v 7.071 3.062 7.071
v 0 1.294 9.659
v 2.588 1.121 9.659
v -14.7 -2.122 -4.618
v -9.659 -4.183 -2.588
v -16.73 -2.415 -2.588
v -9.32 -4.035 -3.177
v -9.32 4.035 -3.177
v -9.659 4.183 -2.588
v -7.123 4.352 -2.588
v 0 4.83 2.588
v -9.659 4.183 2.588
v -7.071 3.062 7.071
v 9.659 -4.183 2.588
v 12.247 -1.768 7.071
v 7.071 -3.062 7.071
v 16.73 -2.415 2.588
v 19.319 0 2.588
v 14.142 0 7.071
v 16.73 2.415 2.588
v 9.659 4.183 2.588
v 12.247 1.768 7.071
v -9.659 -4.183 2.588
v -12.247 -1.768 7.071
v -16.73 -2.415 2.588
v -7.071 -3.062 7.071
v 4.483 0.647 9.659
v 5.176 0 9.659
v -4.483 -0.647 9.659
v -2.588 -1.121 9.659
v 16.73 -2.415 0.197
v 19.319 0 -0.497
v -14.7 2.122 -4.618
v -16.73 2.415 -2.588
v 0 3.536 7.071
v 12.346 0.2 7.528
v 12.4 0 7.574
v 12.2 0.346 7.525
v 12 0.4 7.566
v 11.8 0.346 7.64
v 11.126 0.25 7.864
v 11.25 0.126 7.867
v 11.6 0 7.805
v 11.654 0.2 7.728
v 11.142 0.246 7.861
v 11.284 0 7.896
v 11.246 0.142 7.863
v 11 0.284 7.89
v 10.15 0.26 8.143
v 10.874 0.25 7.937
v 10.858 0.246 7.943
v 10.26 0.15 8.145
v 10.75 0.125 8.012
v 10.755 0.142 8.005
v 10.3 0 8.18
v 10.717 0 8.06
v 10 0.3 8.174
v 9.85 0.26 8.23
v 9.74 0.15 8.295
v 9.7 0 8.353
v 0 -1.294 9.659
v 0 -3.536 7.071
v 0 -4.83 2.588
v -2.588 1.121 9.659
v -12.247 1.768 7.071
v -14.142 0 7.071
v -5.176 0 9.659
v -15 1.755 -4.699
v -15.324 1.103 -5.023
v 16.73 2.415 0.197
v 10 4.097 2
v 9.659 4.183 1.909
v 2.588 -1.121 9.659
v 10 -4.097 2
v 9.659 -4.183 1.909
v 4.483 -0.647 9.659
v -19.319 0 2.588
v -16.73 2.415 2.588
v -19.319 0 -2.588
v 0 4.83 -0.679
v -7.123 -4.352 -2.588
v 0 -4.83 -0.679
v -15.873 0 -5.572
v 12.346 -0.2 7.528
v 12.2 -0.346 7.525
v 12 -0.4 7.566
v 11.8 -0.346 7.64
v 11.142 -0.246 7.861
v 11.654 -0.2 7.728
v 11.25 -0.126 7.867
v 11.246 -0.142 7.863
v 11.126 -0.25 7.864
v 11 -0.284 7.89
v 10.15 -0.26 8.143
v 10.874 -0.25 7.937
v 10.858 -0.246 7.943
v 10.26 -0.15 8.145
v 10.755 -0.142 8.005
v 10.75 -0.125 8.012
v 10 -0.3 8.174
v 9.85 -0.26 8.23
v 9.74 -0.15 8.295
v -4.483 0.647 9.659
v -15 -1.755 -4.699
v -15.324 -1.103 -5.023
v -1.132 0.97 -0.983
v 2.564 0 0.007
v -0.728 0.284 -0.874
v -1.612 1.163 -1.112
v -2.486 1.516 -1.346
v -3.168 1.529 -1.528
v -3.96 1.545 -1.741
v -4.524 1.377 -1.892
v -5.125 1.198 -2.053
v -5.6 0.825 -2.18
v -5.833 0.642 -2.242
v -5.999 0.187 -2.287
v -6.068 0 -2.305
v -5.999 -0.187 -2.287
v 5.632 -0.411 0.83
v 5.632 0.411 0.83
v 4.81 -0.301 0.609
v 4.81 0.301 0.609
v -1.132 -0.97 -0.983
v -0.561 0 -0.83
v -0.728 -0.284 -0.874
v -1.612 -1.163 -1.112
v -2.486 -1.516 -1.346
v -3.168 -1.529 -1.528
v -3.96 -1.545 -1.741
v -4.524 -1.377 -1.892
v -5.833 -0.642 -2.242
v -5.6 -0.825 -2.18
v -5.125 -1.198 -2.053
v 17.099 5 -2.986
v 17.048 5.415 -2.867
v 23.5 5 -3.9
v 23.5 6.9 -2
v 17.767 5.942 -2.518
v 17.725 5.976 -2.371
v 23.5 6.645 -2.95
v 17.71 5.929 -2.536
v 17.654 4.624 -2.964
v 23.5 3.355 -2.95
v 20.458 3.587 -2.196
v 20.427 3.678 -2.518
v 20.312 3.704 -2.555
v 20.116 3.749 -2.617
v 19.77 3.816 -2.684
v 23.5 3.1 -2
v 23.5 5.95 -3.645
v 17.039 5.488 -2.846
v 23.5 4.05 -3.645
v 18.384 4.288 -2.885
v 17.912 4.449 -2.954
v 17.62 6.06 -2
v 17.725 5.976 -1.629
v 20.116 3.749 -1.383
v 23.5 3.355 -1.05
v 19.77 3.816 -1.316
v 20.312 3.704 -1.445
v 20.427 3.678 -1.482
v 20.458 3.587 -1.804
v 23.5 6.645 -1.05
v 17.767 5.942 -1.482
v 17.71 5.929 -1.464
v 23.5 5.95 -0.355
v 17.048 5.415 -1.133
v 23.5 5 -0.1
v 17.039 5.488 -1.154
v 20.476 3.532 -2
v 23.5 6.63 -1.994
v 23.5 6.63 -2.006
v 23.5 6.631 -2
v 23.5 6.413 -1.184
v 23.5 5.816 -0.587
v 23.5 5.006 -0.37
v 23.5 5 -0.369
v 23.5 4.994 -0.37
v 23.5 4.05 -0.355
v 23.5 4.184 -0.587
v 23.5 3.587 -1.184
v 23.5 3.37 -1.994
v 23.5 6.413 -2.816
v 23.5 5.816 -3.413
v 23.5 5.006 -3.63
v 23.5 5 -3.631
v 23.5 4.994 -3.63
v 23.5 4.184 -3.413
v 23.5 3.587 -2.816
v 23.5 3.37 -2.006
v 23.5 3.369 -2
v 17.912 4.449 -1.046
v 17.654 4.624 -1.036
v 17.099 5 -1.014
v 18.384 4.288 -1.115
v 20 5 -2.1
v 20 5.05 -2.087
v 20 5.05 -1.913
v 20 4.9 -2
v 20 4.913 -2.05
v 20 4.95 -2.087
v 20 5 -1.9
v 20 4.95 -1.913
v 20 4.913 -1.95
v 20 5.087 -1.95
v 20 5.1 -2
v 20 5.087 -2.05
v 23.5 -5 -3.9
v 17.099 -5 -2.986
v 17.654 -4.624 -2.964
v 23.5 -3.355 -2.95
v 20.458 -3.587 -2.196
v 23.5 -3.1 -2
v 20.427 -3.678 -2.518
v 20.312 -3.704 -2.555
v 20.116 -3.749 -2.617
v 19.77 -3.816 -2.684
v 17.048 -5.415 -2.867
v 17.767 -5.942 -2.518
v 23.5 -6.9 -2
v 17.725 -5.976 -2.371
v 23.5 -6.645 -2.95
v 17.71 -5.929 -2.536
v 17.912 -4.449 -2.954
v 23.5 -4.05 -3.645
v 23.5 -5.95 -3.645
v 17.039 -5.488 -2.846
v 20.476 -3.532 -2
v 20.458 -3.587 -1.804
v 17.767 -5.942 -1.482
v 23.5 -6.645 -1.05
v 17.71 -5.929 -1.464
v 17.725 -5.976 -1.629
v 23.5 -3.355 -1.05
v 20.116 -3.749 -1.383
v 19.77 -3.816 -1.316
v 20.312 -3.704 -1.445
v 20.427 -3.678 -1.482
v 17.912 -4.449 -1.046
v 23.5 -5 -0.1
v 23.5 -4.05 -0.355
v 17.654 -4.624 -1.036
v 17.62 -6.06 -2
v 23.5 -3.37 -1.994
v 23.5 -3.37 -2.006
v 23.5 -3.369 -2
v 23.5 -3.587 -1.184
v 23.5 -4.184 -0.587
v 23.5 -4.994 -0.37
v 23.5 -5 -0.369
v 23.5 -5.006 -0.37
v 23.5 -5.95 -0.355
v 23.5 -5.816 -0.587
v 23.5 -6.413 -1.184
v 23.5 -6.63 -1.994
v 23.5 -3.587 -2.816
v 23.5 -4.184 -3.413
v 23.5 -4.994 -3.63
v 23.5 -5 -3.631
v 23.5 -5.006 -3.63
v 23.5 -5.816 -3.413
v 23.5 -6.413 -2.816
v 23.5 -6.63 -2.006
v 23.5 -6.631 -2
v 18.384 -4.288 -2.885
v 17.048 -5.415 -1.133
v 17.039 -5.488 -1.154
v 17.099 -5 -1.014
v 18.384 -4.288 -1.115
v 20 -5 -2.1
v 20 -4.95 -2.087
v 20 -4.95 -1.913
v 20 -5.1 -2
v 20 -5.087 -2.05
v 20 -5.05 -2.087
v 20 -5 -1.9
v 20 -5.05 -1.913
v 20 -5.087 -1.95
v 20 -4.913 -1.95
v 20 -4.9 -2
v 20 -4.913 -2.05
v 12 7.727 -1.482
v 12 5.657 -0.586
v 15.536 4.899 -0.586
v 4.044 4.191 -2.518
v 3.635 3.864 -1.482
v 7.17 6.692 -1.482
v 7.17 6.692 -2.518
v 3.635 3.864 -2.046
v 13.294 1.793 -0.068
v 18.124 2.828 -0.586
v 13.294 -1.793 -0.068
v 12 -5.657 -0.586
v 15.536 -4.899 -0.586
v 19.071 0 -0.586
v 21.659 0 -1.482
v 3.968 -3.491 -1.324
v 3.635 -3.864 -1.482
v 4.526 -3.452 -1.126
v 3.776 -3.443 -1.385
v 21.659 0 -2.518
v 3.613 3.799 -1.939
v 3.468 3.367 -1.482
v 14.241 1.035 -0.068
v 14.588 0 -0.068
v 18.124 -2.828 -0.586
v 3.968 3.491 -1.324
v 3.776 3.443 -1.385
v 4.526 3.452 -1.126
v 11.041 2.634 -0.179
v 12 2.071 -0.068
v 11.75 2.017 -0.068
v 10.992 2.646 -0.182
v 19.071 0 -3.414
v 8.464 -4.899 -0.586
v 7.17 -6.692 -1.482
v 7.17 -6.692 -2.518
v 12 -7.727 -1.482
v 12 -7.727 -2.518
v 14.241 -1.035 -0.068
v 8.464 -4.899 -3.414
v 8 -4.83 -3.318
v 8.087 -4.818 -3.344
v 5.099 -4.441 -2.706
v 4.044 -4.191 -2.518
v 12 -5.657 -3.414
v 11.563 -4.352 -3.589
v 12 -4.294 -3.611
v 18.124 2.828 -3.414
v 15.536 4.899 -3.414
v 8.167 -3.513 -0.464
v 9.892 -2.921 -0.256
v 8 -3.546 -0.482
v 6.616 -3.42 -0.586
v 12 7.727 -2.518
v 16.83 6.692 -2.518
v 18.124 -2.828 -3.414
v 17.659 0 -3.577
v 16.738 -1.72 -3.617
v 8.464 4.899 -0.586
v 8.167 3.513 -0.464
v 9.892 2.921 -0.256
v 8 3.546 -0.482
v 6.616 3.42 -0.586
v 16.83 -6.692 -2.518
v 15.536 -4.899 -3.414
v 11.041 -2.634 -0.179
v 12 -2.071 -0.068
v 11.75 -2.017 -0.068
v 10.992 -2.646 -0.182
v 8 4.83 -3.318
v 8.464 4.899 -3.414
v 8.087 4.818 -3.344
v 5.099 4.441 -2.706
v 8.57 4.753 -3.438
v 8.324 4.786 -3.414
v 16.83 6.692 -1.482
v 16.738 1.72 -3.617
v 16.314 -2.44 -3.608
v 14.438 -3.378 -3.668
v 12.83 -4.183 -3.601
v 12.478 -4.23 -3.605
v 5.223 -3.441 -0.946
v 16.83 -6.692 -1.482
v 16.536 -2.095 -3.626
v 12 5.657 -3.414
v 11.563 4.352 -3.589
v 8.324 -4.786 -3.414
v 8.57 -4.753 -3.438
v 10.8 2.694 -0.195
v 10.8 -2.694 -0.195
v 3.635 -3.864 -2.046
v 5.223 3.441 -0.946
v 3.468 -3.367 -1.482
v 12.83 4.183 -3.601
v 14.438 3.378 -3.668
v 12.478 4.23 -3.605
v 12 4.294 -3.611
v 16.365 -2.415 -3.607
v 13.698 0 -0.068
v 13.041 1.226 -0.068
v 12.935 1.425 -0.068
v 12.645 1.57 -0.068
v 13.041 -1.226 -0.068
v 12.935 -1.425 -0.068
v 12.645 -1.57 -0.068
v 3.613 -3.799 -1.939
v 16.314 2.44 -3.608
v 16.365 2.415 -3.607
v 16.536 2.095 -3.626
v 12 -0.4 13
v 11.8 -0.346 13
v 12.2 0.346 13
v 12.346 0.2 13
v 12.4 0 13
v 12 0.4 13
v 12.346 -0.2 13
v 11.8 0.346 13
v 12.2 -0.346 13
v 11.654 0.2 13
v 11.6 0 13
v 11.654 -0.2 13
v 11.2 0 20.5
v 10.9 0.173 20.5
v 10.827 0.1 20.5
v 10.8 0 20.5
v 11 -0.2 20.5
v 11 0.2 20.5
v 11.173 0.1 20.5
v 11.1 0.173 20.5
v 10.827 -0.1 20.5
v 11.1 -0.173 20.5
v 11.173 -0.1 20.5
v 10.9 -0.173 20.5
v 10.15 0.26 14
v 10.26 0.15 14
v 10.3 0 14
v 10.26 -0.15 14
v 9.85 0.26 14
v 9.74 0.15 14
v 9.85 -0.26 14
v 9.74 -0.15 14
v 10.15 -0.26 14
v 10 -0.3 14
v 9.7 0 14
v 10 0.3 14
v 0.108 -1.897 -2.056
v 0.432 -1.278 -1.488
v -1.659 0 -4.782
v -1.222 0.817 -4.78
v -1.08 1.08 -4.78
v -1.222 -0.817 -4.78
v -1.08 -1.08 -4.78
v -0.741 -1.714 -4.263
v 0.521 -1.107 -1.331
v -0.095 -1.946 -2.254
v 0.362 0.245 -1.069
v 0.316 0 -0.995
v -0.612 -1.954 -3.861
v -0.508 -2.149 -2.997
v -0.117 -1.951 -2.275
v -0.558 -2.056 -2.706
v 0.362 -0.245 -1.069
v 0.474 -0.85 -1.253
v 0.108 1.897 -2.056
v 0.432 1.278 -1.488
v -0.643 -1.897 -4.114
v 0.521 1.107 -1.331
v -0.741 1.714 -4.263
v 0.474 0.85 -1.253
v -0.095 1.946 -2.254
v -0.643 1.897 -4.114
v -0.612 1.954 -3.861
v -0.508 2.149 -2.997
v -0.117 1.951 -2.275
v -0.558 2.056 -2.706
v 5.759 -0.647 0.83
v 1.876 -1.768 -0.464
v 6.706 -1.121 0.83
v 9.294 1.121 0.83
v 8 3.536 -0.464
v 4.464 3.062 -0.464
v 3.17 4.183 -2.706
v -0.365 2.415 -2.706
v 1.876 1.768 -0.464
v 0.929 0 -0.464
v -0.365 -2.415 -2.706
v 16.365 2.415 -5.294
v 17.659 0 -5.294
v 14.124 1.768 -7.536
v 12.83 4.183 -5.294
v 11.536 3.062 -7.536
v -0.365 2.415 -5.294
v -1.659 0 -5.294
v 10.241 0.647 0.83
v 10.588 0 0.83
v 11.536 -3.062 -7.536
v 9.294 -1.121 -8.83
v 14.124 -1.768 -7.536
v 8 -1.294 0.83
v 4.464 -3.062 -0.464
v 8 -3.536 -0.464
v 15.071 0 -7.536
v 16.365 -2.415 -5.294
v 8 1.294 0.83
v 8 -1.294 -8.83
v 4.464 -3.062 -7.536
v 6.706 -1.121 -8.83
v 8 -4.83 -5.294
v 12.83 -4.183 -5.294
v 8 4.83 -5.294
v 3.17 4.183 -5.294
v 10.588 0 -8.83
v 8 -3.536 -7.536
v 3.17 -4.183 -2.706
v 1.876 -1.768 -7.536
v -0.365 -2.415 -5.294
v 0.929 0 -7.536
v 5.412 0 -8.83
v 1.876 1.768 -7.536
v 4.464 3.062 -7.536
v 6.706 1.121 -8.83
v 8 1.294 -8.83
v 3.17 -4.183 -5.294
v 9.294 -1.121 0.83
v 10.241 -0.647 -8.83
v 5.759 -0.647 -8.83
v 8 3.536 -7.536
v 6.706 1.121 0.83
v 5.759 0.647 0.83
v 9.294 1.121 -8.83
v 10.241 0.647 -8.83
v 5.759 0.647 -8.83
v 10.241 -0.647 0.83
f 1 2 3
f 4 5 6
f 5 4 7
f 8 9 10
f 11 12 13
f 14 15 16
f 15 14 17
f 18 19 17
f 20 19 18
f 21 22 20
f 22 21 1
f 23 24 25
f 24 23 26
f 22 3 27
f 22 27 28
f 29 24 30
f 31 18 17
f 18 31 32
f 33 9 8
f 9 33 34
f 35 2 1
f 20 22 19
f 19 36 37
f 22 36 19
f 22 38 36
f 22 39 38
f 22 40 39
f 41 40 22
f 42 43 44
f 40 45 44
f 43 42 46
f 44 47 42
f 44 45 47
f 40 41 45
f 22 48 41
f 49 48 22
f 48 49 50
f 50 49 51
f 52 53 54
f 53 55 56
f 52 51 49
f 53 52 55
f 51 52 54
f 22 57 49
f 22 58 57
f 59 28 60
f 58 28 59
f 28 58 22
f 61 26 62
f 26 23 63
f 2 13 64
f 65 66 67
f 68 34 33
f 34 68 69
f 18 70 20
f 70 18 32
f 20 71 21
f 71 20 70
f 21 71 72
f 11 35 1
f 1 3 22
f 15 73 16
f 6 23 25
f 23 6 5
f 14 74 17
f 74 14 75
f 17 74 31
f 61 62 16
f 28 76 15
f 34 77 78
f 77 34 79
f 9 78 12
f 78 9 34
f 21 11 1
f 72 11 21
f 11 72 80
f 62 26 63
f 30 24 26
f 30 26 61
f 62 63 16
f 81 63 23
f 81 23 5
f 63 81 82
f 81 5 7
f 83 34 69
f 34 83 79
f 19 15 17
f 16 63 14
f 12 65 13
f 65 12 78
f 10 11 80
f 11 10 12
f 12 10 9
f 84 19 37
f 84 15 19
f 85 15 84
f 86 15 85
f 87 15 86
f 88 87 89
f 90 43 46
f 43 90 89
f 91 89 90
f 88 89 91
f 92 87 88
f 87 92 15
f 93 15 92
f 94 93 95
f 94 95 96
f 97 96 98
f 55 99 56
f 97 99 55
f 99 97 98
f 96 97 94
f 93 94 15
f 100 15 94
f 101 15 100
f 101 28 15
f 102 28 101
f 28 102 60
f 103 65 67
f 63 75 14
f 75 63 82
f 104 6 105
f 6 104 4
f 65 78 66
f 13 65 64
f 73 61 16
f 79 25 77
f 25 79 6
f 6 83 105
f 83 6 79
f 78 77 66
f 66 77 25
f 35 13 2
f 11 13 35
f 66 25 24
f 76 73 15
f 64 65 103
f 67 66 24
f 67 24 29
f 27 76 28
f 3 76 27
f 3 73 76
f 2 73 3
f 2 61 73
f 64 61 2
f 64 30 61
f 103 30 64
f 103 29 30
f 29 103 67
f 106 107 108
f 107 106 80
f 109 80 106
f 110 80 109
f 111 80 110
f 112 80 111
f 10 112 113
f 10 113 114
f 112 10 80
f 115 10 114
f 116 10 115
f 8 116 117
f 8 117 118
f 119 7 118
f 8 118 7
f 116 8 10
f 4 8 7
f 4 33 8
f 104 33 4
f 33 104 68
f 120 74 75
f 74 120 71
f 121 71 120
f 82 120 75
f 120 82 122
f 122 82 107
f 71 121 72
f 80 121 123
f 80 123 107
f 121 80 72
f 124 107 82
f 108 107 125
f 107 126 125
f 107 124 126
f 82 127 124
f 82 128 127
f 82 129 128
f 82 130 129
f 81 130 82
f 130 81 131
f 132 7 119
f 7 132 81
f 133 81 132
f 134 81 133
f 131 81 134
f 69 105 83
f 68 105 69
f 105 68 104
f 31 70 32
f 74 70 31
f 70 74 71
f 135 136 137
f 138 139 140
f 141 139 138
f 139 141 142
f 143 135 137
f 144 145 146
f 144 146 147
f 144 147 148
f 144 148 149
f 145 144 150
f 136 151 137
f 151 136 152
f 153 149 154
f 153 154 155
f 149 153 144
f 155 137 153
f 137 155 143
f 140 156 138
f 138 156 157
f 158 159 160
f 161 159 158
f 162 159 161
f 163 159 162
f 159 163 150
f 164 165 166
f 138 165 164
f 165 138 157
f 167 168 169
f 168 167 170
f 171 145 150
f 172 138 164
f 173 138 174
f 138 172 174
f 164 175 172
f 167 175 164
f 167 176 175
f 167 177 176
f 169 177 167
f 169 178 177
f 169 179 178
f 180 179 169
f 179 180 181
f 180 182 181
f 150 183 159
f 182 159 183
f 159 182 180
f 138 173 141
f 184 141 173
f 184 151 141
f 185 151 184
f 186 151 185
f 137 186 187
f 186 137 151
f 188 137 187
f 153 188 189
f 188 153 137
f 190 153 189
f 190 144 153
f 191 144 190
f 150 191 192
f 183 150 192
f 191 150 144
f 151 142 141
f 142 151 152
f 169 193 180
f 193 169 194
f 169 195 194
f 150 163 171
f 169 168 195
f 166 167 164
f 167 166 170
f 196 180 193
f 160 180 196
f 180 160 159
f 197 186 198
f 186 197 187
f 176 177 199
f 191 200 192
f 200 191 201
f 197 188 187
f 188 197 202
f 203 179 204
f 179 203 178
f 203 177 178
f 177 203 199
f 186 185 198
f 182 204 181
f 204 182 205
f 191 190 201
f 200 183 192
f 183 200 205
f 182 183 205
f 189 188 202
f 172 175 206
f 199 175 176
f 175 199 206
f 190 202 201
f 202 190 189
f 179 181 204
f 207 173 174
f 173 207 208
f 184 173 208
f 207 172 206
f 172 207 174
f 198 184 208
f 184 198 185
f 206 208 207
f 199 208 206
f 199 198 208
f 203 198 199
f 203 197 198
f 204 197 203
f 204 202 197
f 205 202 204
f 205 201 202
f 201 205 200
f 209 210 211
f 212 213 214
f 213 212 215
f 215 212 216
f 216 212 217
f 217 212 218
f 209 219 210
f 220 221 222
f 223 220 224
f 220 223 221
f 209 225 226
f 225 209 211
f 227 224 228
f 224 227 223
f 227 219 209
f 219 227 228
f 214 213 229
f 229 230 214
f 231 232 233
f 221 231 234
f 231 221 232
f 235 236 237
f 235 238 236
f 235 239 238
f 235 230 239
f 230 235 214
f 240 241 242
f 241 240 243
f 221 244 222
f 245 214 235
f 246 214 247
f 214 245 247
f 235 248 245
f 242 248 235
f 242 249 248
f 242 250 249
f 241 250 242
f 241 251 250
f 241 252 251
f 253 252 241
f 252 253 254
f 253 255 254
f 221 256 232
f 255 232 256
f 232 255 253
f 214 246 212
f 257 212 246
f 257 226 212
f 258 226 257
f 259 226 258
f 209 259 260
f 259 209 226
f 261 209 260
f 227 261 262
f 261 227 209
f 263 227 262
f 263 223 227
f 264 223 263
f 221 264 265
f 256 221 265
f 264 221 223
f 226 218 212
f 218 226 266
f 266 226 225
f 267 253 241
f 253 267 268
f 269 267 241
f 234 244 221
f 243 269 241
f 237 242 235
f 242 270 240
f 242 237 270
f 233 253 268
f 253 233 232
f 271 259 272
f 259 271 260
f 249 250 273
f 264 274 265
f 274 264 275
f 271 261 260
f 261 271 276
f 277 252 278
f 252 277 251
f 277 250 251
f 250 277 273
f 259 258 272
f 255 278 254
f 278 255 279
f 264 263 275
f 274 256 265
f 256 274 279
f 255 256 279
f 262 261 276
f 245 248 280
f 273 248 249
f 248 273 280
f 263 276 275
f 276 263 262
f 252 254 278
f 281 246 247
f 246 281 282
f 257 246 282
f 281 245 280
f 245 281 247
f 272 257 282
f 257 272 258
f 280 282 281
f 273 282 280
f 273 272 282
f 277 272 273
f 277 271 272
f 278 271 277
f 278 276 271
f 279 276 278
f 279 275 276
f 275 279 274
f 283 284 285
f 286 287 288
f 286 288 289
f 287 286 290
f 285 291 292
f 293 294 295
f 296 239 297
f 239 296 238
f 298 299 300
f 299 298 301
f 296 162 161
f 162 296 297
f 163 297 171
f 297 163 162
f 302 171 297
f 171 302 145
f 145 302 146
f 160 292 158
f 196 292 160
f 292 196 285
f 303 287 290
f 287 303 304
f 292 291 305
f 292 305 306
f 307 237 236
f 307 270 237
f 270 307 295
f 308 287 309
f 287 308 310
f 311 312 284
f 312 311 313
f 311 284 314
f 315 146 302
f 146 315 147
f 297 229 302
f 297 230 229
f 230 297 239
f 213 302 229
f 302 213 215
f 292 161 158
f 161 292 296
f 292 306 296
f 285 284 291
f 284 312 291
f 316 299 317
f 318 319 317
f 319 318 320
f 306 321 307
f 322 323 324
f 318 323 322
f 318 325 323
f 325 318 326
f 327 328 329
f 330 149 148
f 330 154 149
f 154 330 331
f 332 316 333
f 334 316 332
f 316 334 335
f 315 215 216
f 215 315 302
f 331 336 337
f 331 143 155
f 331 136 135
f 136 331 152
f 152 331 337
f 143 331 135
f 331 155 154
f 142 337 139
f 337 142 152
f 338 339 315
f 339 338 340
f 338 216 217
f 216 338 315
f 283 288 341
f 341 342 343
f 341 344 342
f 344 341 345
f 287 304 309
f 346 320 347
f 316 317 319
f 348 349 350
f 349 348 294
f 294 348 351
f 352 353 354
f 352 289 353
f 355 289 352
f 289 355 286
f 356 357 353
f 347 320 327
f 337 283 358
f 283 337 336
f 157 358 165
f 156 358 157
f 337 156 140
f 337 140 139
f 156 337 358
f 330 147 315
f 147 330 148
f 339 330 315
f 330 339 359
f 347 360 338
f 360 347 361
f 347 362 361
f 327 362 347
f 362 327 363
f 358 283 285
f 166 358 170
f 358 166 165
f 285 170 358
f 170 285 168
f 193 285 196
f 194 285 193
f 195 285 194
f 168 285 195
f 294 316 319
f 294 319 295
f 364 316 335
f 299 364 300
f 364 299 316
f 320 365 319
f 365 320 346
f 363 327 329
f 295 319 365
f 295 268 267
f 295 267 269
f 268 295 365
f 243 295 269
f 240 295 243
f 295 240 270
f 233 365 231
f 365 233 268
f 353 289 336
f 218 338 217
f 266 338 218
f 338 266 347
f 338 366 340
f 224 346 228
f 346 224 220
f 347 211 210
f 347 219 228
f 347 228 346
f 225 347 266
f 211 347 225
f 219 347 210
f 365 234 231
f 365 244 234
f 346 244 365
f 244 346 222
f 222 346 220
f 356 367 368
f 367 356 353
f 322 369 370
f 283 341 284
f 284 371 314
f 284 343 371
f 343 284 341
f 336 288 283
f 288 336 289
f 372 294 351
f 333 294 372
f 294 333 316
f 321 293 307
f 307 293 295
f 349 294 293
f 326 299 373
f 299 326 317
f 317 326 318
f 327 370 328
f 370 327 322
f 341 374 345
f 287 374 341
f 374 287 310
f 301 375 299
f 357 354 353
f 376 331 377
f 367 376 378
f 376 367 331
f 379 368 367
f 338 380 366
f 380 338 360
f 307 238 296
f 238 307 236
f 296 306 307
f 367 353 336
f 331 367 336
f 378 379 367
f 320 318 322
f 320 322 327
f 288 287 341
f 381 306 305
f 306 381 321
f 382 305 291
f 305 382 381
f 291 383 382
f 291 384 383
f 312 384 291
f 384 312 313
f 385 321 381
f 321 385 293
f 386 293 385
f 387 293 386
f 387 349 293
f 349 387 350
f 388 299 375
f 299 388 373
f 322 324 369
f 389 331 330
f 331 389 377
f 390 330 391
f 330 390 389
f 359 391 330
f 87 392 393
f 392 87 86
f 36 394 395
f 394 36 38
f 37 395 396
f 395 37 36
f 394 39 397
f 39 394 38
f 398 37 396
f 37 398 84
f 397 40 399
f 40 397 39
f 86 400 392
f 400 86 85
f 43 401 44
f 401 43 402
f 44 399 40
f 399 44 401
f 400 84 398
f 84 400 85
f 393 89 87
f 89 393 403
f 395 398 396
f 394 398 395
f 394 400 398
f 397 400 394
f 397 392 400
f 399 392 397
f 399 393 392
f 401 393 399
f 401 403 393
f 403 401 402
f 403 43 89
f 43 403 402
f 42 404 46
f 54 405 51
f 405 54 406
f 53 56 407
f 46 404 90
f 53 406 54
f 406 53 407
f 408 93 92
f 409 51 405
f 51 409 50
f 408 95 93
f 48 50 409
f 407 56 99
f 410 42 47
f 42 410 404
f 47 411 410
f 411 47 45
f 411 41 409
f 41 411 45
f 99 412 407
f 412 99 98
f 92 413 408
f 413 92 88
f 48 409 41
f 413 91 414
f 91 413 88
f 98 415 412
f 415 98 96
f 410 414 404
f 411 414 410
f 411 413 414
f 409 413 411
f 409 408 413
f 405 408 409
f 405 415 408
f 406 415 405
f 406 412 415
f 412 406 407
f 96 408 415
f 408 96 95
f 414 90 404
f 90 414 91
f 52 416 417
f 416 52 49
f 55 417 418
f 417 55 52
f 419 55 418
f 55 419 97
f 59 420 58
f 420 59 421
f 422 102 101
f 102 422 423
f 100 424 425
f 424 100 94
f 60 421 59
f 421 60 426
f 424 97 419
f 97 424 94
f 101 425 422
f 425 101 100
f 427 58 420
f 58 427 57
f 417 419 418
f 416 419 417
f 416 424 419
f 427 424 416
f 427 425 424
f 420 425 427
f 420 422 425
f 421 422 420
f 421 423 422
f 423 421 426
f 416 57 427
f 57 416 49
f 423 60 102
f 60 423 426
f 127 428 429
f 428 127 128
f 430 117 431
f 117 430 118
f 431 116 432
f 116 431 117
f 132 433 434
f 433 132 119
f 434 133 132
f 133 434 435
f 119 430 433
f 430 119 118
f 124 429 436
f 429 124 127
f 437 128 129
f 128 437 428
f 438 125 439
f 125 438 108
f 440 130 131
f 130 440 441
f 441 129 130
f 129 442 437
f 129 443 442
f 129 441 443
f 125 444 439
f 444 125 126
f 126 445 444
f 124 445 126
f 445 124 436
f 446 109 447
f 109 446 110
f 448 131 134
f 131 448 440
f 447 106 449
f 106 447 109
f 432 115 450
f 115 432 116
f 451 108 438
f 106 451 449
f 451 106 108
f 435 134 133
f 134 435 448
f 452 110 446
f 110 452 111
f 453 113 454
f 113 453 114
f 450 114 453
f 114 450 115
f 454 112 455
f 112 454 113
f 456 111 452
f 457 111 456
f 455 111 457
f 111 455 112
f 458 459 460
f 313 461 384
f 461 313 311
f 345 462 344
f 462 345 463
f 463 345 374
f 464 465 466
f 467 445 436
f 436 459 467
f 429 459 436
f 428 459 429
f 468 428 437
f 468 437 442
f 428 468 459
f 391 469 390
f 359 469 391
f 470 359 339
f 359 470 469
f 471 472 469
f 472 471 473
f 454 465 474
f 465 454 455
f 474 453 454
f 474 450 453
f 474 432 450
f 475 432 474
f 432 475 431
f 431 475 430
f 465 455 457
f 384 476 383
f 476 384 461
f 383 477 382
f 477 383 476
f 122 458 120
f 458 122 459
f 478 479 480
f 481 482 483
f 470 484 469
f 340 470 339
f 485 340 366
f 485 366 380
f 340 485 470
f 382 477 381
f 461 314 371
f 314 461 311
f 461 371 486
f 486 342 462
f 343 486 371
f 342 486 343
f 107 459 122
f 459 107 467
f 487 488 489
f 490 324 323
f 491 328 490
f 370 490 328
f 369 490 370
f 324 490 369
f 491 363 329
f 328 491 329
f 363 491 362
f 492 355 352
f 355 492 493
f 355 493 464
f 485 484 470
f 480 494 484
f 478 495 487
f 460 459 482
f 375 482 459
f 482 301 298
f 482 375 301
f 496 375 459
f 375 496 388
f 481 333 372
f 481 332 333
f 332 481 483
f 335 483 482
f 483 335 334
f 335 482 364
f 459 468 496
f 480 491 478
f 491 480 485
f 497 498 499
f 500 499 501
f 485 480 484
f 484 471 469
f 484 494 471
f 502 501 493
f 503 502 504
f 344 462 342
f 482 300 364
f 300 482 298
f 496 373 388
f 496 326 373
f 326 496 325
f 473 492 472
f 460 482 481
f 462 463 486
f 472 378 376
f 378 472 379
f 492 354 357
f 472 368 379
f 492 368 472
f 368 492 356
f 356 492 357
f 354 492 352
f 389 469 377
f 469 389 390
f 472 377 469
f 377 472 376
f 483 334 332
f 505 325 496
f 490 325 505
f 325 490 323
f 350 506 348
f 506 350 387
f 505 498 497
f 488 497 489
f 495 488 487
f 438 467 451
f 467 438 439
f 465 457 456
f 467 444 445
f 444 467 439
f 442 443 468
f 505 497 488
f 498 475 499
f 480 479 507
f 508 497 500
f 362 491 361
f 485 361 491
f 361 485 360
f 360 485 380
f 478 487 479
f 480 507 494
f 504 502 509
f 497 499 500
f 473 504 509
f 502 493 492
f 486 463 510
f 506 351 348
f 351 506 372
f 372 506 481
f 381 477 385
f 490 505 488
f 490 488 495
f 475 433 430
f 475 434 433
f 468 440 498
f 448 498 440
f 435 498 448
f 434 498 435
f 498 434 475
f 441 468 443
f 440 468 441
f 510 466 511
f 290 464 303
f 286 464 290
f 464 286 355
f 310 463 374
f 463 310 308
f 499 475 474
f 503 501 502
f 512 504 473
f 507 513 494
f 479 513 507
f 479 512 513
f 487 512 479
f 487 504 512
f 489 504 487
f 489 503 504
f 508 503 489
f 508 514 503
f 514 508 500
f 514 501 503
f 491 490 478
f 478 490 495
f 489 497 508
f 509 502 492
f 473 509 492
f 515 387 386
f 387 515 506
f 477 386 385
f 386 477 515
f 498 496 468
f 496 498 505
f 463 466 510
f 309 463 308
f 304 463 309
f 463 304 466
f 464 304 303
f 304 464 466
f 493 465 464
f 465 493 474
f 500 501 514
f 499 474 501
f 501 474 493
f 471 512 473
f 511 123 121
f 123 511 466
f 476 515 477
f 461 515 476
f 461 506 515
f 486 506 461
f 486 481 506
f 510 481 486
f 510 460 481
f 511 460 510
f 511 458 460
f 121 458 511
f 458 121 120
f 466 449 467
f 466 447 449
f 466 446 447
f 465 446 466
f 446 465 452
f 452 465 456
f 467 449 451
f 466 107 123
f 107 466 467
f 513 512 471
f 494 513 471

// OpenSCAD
$fn=12;
union() {
difference() {
	scale (v = [2, 0.5, 1])
		sphere(r = 10);
	translate(v = [10, 0, -48])
		rotate(a = 90, v = [1, 0, 0])
			cylinder(h = 10, r1 = 50, r2 = 50, center = true);
}
translate(v = [-0.5, 0, -3])
	rotate(a = 110, v = [0, 1, 0])
		cylinder(h = 14, r1 = 1, r2 = 3.3, center = true);

translate(v = [8, 0, -4])
scale(v = [1, 0.5, 0.5])
	sphere(r = 10);

translate(v = [0, 0, 3]) { 
translate(v = [12, 0, -5])
	scale(v = [1, 0.8, 0.2])
		sphere(r = 10);
translate(v = [12, 0, 5])
	cylinder(h = 10, r1 = 0.4, r2 = 0.4, center = true);
translate(v = [11, 0, 10])
	cylinder(h = 15, r1 = 0.3, r2 = 0.2, center = true);
translate(v = [10, 0, 7])
	cylinder(h = 8, r1 = 0.3, r2 = 0.3, center = true);
translate(v = [20, 5, -5])
	rotate(a = 90, v = [0, 1, 0]) {
		difference() {
			cylinder(h = 7, r1 = 0.9, r2 = 1.9, center = true);
			translate(v = [0, 0, 2])
			cylinder(h = 4, r1 = 0.1, r2 = 1.85, center = true);
		}
	}
translate(v = [20, -5, -5])
	rotate(a = 90, v = [0, 1, 0])
		difference() {
			cylinder(h = 7, r1 = 0.9, r2 = 1.9, center = true);
			translate(v = [0, 0, 2])
			cylinder(h = 4, r1 = 0.1, r2 = 1.85, center = true);
		}	
	}	
}
